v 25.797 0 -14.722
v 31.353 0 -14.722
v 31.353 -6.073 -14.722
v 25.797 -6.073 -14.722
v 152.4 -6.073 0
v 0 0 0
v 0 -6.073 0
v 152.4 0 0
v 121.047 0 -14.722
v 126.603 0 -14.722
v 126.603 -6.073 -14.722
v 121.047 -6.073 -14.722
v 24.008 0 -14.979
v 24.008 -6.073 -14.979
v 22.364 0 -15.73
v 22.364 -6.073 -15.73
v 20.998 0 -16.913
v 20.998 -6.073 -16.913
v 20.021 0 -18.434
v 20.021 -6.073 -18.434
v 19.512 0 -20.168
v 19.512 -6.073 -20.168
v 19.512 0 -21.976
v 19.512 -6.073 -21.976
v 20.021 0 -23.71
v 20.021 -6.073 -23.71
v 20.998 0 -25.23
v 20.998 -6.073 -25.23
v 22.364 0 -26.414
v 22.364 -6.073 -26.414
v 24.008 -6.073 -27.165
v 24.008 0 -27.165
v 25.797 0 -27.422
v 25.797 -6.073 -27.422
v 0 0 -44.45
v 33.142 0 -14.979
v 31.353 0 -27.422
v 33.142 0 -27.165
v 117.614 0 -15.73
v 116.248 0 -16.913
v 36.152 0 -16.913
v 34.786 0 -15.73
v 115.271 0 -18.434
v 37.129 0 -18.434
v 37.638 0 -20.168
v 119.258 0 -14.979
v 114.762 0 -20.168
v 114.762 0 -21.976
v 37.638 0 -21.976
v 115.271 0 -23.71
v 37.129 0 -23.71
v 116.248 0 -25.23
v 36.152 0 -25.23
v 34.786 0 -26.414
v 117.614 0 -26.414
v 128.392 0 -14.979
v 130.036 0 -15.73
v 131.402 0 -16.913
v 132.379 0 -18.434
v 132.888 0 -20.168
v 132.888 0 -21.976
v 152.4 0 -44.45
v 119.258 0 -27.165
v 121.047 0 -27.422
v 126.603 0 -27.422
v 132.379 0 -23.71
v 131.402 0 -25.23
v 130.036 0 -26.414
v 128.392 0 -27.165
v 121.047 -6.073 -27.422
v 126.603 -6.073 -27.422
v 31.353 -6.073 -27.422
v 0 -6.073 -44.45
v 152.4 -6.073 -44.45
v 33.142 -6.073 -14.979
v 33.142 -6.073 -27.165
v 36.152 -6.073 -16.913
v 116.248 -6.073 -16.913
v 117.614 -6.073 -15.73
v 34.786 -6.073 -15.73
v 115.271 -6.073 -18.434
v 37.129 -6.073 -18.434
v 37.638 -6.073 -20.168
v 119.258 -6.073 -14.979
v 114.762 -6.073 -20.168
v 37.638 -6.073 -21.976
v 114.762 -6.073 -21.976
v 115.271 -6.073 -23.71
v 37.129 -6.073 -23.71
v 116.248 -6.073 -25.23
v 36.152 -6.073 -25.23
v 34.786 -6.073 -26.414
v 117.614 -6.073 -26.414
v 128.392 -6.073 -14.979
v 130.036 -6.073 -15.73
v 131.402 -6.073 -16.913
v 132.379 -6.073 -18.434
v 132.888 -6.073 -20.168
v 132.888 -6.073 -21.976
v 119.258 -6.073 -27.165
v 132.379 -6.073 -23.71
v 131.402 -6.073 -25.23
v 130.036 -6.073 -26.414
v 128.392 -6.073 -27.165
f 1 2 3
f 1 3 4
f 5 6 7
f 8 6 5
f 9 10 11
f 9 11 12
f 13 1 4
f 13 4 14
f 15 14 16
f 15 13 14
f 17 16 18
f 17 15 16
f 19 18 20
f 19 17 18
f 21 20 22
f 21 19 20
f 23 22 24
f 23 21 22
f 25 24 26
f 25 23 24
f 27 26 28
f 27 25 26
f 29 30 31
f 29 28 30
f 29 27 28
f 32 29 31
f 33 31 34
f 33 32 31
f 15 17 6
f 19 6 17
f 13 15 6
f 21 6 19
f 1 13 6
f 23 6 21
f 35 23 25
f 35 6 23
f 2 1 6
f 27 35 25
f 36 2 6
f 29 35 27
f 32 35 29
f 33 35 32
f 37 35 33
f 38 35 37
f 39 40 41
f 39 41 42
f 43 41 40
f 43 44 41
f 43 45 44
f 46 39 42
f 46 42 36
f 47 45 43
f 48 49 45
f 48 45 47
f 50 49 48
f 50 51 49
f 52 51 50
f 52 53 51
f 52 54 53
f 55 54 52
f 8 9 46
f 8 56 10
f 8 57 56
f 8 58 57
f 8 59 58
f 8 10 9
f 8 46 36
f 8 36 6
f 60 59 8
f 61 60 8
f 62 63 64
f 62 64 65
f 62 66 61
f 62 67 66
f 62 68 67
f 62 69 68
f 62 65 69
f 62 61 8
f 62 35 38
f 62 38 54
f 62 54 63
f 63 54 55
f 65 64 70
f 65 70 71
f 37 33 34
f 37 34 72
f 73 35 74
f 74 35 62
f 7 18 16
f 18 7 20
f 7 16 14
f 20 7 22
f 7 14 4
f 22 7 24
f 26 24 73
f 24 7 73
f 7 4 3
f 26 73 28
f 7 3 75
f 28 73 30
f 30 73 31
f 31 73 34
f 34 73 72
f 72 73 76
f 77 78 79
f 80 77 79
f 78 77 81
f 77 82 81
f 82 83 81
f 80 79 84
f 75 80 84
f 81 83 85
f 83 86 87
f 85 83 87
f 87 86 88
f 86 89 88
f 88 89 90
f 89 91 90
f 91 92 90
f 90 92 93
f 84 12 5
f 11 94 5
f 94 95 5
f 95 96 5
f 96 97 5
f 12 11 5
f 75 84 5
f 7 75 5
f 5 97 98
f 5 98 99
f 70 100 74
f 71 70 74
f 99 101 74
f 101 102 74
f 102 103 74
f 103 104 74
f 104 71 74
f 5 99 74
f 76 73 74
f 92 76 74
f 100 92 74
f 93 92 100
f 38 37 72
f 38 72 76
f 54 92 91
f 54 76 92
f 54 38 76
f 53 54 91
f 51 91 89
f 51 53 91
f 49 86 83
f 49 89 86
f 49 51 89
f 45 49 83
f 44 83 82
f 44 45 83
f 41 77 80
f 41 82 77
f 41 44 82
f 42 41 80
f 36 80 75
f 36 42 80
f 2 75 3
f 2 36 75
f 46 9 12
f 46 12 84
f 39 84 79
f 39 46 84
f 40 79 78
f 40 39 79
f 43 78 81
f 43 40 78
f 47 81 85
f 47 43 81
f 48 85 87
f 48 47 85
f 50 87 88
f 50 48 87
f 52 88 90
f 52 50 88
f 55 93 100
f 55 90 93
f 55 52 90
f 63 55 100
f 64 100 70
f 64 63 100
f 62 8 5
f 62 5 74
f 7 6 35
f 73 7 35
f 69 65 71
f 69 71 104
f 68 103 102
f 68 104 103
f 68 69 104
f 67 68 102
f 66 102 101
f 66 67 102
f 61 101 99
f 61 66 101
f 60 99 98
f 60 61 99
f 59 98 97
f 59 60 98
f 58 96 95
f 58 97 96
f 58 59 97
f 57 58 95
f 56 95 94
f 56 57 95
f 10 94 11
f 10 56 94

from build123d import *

# Parameters (mm, degrees)
SKETCH2_W               = 152.4
SKETCH2_H               = 44.45
BASE_FLANGE1_DEPTH      = 6.07314
CUT_EXTRUDE1_DEPTH      = 159.86612455
CUT_EXTRUDE1_DEPTH_BACK = 159.86612455


# Sheet-metal steps are written as plain solids
with BuildPart() as part:
    # Sketch2 → Base-Flange1 (new body)
    with BuildSketch(Plane(origin=(0, 0, 0), x_dir=(1, 0, 0), z_dir=(0, 1, 0))):
        with Locations((76.2, 22.225)):
            Rectangle(SKETCH2_W, SKETCH2_H)
    extrude(amount=-BASE_FLANGE1_DEPTH)

    # Sketch7 → Cut-Extrude1 (cut, two sides: drawn at the far end of the back side and taken through both)
    with BuildSketch(Plane.XZ.offset(6.07314).offset(-CUT_EXTRUDE1_DEPTH_BACK)):
        with BuildLine():
            Line((121.046875, -27.42184), (126.603125, -27.42184))
            ThreePointArc((126.603125, -27.42184), (132.953125, -21.07184), (126.603125, -14.72184))
            Line((126.603125, -14.72184), (121.046875, -14.72184))
            ThreePointArc((121.046875, -14.72184), (114.696875, -21.07184), (121.046875, -27.42184))
        make_face()
        with BuildLine():
            Line((31.353125, -14.72184), (25.796875, -14.72184))
            ThreePointArc((25.796875, -14.72184), (19.446875, -21.07184), (25.796875, -27.42184))
            Line((25.796875, -27.42184), (31.353125, -27.42184))
            ThreePointArc((31.353125, -27.42184), (37.703125, -21.07184), (31.353125, -14.72184))
        make_face()
    extrude(amount=CUT_EXTRUDE1_DEPTH + CUT_EXTRUDE1_DEPTH_BACK, mode=Mode.SUBTRACT)


solid = part.part
